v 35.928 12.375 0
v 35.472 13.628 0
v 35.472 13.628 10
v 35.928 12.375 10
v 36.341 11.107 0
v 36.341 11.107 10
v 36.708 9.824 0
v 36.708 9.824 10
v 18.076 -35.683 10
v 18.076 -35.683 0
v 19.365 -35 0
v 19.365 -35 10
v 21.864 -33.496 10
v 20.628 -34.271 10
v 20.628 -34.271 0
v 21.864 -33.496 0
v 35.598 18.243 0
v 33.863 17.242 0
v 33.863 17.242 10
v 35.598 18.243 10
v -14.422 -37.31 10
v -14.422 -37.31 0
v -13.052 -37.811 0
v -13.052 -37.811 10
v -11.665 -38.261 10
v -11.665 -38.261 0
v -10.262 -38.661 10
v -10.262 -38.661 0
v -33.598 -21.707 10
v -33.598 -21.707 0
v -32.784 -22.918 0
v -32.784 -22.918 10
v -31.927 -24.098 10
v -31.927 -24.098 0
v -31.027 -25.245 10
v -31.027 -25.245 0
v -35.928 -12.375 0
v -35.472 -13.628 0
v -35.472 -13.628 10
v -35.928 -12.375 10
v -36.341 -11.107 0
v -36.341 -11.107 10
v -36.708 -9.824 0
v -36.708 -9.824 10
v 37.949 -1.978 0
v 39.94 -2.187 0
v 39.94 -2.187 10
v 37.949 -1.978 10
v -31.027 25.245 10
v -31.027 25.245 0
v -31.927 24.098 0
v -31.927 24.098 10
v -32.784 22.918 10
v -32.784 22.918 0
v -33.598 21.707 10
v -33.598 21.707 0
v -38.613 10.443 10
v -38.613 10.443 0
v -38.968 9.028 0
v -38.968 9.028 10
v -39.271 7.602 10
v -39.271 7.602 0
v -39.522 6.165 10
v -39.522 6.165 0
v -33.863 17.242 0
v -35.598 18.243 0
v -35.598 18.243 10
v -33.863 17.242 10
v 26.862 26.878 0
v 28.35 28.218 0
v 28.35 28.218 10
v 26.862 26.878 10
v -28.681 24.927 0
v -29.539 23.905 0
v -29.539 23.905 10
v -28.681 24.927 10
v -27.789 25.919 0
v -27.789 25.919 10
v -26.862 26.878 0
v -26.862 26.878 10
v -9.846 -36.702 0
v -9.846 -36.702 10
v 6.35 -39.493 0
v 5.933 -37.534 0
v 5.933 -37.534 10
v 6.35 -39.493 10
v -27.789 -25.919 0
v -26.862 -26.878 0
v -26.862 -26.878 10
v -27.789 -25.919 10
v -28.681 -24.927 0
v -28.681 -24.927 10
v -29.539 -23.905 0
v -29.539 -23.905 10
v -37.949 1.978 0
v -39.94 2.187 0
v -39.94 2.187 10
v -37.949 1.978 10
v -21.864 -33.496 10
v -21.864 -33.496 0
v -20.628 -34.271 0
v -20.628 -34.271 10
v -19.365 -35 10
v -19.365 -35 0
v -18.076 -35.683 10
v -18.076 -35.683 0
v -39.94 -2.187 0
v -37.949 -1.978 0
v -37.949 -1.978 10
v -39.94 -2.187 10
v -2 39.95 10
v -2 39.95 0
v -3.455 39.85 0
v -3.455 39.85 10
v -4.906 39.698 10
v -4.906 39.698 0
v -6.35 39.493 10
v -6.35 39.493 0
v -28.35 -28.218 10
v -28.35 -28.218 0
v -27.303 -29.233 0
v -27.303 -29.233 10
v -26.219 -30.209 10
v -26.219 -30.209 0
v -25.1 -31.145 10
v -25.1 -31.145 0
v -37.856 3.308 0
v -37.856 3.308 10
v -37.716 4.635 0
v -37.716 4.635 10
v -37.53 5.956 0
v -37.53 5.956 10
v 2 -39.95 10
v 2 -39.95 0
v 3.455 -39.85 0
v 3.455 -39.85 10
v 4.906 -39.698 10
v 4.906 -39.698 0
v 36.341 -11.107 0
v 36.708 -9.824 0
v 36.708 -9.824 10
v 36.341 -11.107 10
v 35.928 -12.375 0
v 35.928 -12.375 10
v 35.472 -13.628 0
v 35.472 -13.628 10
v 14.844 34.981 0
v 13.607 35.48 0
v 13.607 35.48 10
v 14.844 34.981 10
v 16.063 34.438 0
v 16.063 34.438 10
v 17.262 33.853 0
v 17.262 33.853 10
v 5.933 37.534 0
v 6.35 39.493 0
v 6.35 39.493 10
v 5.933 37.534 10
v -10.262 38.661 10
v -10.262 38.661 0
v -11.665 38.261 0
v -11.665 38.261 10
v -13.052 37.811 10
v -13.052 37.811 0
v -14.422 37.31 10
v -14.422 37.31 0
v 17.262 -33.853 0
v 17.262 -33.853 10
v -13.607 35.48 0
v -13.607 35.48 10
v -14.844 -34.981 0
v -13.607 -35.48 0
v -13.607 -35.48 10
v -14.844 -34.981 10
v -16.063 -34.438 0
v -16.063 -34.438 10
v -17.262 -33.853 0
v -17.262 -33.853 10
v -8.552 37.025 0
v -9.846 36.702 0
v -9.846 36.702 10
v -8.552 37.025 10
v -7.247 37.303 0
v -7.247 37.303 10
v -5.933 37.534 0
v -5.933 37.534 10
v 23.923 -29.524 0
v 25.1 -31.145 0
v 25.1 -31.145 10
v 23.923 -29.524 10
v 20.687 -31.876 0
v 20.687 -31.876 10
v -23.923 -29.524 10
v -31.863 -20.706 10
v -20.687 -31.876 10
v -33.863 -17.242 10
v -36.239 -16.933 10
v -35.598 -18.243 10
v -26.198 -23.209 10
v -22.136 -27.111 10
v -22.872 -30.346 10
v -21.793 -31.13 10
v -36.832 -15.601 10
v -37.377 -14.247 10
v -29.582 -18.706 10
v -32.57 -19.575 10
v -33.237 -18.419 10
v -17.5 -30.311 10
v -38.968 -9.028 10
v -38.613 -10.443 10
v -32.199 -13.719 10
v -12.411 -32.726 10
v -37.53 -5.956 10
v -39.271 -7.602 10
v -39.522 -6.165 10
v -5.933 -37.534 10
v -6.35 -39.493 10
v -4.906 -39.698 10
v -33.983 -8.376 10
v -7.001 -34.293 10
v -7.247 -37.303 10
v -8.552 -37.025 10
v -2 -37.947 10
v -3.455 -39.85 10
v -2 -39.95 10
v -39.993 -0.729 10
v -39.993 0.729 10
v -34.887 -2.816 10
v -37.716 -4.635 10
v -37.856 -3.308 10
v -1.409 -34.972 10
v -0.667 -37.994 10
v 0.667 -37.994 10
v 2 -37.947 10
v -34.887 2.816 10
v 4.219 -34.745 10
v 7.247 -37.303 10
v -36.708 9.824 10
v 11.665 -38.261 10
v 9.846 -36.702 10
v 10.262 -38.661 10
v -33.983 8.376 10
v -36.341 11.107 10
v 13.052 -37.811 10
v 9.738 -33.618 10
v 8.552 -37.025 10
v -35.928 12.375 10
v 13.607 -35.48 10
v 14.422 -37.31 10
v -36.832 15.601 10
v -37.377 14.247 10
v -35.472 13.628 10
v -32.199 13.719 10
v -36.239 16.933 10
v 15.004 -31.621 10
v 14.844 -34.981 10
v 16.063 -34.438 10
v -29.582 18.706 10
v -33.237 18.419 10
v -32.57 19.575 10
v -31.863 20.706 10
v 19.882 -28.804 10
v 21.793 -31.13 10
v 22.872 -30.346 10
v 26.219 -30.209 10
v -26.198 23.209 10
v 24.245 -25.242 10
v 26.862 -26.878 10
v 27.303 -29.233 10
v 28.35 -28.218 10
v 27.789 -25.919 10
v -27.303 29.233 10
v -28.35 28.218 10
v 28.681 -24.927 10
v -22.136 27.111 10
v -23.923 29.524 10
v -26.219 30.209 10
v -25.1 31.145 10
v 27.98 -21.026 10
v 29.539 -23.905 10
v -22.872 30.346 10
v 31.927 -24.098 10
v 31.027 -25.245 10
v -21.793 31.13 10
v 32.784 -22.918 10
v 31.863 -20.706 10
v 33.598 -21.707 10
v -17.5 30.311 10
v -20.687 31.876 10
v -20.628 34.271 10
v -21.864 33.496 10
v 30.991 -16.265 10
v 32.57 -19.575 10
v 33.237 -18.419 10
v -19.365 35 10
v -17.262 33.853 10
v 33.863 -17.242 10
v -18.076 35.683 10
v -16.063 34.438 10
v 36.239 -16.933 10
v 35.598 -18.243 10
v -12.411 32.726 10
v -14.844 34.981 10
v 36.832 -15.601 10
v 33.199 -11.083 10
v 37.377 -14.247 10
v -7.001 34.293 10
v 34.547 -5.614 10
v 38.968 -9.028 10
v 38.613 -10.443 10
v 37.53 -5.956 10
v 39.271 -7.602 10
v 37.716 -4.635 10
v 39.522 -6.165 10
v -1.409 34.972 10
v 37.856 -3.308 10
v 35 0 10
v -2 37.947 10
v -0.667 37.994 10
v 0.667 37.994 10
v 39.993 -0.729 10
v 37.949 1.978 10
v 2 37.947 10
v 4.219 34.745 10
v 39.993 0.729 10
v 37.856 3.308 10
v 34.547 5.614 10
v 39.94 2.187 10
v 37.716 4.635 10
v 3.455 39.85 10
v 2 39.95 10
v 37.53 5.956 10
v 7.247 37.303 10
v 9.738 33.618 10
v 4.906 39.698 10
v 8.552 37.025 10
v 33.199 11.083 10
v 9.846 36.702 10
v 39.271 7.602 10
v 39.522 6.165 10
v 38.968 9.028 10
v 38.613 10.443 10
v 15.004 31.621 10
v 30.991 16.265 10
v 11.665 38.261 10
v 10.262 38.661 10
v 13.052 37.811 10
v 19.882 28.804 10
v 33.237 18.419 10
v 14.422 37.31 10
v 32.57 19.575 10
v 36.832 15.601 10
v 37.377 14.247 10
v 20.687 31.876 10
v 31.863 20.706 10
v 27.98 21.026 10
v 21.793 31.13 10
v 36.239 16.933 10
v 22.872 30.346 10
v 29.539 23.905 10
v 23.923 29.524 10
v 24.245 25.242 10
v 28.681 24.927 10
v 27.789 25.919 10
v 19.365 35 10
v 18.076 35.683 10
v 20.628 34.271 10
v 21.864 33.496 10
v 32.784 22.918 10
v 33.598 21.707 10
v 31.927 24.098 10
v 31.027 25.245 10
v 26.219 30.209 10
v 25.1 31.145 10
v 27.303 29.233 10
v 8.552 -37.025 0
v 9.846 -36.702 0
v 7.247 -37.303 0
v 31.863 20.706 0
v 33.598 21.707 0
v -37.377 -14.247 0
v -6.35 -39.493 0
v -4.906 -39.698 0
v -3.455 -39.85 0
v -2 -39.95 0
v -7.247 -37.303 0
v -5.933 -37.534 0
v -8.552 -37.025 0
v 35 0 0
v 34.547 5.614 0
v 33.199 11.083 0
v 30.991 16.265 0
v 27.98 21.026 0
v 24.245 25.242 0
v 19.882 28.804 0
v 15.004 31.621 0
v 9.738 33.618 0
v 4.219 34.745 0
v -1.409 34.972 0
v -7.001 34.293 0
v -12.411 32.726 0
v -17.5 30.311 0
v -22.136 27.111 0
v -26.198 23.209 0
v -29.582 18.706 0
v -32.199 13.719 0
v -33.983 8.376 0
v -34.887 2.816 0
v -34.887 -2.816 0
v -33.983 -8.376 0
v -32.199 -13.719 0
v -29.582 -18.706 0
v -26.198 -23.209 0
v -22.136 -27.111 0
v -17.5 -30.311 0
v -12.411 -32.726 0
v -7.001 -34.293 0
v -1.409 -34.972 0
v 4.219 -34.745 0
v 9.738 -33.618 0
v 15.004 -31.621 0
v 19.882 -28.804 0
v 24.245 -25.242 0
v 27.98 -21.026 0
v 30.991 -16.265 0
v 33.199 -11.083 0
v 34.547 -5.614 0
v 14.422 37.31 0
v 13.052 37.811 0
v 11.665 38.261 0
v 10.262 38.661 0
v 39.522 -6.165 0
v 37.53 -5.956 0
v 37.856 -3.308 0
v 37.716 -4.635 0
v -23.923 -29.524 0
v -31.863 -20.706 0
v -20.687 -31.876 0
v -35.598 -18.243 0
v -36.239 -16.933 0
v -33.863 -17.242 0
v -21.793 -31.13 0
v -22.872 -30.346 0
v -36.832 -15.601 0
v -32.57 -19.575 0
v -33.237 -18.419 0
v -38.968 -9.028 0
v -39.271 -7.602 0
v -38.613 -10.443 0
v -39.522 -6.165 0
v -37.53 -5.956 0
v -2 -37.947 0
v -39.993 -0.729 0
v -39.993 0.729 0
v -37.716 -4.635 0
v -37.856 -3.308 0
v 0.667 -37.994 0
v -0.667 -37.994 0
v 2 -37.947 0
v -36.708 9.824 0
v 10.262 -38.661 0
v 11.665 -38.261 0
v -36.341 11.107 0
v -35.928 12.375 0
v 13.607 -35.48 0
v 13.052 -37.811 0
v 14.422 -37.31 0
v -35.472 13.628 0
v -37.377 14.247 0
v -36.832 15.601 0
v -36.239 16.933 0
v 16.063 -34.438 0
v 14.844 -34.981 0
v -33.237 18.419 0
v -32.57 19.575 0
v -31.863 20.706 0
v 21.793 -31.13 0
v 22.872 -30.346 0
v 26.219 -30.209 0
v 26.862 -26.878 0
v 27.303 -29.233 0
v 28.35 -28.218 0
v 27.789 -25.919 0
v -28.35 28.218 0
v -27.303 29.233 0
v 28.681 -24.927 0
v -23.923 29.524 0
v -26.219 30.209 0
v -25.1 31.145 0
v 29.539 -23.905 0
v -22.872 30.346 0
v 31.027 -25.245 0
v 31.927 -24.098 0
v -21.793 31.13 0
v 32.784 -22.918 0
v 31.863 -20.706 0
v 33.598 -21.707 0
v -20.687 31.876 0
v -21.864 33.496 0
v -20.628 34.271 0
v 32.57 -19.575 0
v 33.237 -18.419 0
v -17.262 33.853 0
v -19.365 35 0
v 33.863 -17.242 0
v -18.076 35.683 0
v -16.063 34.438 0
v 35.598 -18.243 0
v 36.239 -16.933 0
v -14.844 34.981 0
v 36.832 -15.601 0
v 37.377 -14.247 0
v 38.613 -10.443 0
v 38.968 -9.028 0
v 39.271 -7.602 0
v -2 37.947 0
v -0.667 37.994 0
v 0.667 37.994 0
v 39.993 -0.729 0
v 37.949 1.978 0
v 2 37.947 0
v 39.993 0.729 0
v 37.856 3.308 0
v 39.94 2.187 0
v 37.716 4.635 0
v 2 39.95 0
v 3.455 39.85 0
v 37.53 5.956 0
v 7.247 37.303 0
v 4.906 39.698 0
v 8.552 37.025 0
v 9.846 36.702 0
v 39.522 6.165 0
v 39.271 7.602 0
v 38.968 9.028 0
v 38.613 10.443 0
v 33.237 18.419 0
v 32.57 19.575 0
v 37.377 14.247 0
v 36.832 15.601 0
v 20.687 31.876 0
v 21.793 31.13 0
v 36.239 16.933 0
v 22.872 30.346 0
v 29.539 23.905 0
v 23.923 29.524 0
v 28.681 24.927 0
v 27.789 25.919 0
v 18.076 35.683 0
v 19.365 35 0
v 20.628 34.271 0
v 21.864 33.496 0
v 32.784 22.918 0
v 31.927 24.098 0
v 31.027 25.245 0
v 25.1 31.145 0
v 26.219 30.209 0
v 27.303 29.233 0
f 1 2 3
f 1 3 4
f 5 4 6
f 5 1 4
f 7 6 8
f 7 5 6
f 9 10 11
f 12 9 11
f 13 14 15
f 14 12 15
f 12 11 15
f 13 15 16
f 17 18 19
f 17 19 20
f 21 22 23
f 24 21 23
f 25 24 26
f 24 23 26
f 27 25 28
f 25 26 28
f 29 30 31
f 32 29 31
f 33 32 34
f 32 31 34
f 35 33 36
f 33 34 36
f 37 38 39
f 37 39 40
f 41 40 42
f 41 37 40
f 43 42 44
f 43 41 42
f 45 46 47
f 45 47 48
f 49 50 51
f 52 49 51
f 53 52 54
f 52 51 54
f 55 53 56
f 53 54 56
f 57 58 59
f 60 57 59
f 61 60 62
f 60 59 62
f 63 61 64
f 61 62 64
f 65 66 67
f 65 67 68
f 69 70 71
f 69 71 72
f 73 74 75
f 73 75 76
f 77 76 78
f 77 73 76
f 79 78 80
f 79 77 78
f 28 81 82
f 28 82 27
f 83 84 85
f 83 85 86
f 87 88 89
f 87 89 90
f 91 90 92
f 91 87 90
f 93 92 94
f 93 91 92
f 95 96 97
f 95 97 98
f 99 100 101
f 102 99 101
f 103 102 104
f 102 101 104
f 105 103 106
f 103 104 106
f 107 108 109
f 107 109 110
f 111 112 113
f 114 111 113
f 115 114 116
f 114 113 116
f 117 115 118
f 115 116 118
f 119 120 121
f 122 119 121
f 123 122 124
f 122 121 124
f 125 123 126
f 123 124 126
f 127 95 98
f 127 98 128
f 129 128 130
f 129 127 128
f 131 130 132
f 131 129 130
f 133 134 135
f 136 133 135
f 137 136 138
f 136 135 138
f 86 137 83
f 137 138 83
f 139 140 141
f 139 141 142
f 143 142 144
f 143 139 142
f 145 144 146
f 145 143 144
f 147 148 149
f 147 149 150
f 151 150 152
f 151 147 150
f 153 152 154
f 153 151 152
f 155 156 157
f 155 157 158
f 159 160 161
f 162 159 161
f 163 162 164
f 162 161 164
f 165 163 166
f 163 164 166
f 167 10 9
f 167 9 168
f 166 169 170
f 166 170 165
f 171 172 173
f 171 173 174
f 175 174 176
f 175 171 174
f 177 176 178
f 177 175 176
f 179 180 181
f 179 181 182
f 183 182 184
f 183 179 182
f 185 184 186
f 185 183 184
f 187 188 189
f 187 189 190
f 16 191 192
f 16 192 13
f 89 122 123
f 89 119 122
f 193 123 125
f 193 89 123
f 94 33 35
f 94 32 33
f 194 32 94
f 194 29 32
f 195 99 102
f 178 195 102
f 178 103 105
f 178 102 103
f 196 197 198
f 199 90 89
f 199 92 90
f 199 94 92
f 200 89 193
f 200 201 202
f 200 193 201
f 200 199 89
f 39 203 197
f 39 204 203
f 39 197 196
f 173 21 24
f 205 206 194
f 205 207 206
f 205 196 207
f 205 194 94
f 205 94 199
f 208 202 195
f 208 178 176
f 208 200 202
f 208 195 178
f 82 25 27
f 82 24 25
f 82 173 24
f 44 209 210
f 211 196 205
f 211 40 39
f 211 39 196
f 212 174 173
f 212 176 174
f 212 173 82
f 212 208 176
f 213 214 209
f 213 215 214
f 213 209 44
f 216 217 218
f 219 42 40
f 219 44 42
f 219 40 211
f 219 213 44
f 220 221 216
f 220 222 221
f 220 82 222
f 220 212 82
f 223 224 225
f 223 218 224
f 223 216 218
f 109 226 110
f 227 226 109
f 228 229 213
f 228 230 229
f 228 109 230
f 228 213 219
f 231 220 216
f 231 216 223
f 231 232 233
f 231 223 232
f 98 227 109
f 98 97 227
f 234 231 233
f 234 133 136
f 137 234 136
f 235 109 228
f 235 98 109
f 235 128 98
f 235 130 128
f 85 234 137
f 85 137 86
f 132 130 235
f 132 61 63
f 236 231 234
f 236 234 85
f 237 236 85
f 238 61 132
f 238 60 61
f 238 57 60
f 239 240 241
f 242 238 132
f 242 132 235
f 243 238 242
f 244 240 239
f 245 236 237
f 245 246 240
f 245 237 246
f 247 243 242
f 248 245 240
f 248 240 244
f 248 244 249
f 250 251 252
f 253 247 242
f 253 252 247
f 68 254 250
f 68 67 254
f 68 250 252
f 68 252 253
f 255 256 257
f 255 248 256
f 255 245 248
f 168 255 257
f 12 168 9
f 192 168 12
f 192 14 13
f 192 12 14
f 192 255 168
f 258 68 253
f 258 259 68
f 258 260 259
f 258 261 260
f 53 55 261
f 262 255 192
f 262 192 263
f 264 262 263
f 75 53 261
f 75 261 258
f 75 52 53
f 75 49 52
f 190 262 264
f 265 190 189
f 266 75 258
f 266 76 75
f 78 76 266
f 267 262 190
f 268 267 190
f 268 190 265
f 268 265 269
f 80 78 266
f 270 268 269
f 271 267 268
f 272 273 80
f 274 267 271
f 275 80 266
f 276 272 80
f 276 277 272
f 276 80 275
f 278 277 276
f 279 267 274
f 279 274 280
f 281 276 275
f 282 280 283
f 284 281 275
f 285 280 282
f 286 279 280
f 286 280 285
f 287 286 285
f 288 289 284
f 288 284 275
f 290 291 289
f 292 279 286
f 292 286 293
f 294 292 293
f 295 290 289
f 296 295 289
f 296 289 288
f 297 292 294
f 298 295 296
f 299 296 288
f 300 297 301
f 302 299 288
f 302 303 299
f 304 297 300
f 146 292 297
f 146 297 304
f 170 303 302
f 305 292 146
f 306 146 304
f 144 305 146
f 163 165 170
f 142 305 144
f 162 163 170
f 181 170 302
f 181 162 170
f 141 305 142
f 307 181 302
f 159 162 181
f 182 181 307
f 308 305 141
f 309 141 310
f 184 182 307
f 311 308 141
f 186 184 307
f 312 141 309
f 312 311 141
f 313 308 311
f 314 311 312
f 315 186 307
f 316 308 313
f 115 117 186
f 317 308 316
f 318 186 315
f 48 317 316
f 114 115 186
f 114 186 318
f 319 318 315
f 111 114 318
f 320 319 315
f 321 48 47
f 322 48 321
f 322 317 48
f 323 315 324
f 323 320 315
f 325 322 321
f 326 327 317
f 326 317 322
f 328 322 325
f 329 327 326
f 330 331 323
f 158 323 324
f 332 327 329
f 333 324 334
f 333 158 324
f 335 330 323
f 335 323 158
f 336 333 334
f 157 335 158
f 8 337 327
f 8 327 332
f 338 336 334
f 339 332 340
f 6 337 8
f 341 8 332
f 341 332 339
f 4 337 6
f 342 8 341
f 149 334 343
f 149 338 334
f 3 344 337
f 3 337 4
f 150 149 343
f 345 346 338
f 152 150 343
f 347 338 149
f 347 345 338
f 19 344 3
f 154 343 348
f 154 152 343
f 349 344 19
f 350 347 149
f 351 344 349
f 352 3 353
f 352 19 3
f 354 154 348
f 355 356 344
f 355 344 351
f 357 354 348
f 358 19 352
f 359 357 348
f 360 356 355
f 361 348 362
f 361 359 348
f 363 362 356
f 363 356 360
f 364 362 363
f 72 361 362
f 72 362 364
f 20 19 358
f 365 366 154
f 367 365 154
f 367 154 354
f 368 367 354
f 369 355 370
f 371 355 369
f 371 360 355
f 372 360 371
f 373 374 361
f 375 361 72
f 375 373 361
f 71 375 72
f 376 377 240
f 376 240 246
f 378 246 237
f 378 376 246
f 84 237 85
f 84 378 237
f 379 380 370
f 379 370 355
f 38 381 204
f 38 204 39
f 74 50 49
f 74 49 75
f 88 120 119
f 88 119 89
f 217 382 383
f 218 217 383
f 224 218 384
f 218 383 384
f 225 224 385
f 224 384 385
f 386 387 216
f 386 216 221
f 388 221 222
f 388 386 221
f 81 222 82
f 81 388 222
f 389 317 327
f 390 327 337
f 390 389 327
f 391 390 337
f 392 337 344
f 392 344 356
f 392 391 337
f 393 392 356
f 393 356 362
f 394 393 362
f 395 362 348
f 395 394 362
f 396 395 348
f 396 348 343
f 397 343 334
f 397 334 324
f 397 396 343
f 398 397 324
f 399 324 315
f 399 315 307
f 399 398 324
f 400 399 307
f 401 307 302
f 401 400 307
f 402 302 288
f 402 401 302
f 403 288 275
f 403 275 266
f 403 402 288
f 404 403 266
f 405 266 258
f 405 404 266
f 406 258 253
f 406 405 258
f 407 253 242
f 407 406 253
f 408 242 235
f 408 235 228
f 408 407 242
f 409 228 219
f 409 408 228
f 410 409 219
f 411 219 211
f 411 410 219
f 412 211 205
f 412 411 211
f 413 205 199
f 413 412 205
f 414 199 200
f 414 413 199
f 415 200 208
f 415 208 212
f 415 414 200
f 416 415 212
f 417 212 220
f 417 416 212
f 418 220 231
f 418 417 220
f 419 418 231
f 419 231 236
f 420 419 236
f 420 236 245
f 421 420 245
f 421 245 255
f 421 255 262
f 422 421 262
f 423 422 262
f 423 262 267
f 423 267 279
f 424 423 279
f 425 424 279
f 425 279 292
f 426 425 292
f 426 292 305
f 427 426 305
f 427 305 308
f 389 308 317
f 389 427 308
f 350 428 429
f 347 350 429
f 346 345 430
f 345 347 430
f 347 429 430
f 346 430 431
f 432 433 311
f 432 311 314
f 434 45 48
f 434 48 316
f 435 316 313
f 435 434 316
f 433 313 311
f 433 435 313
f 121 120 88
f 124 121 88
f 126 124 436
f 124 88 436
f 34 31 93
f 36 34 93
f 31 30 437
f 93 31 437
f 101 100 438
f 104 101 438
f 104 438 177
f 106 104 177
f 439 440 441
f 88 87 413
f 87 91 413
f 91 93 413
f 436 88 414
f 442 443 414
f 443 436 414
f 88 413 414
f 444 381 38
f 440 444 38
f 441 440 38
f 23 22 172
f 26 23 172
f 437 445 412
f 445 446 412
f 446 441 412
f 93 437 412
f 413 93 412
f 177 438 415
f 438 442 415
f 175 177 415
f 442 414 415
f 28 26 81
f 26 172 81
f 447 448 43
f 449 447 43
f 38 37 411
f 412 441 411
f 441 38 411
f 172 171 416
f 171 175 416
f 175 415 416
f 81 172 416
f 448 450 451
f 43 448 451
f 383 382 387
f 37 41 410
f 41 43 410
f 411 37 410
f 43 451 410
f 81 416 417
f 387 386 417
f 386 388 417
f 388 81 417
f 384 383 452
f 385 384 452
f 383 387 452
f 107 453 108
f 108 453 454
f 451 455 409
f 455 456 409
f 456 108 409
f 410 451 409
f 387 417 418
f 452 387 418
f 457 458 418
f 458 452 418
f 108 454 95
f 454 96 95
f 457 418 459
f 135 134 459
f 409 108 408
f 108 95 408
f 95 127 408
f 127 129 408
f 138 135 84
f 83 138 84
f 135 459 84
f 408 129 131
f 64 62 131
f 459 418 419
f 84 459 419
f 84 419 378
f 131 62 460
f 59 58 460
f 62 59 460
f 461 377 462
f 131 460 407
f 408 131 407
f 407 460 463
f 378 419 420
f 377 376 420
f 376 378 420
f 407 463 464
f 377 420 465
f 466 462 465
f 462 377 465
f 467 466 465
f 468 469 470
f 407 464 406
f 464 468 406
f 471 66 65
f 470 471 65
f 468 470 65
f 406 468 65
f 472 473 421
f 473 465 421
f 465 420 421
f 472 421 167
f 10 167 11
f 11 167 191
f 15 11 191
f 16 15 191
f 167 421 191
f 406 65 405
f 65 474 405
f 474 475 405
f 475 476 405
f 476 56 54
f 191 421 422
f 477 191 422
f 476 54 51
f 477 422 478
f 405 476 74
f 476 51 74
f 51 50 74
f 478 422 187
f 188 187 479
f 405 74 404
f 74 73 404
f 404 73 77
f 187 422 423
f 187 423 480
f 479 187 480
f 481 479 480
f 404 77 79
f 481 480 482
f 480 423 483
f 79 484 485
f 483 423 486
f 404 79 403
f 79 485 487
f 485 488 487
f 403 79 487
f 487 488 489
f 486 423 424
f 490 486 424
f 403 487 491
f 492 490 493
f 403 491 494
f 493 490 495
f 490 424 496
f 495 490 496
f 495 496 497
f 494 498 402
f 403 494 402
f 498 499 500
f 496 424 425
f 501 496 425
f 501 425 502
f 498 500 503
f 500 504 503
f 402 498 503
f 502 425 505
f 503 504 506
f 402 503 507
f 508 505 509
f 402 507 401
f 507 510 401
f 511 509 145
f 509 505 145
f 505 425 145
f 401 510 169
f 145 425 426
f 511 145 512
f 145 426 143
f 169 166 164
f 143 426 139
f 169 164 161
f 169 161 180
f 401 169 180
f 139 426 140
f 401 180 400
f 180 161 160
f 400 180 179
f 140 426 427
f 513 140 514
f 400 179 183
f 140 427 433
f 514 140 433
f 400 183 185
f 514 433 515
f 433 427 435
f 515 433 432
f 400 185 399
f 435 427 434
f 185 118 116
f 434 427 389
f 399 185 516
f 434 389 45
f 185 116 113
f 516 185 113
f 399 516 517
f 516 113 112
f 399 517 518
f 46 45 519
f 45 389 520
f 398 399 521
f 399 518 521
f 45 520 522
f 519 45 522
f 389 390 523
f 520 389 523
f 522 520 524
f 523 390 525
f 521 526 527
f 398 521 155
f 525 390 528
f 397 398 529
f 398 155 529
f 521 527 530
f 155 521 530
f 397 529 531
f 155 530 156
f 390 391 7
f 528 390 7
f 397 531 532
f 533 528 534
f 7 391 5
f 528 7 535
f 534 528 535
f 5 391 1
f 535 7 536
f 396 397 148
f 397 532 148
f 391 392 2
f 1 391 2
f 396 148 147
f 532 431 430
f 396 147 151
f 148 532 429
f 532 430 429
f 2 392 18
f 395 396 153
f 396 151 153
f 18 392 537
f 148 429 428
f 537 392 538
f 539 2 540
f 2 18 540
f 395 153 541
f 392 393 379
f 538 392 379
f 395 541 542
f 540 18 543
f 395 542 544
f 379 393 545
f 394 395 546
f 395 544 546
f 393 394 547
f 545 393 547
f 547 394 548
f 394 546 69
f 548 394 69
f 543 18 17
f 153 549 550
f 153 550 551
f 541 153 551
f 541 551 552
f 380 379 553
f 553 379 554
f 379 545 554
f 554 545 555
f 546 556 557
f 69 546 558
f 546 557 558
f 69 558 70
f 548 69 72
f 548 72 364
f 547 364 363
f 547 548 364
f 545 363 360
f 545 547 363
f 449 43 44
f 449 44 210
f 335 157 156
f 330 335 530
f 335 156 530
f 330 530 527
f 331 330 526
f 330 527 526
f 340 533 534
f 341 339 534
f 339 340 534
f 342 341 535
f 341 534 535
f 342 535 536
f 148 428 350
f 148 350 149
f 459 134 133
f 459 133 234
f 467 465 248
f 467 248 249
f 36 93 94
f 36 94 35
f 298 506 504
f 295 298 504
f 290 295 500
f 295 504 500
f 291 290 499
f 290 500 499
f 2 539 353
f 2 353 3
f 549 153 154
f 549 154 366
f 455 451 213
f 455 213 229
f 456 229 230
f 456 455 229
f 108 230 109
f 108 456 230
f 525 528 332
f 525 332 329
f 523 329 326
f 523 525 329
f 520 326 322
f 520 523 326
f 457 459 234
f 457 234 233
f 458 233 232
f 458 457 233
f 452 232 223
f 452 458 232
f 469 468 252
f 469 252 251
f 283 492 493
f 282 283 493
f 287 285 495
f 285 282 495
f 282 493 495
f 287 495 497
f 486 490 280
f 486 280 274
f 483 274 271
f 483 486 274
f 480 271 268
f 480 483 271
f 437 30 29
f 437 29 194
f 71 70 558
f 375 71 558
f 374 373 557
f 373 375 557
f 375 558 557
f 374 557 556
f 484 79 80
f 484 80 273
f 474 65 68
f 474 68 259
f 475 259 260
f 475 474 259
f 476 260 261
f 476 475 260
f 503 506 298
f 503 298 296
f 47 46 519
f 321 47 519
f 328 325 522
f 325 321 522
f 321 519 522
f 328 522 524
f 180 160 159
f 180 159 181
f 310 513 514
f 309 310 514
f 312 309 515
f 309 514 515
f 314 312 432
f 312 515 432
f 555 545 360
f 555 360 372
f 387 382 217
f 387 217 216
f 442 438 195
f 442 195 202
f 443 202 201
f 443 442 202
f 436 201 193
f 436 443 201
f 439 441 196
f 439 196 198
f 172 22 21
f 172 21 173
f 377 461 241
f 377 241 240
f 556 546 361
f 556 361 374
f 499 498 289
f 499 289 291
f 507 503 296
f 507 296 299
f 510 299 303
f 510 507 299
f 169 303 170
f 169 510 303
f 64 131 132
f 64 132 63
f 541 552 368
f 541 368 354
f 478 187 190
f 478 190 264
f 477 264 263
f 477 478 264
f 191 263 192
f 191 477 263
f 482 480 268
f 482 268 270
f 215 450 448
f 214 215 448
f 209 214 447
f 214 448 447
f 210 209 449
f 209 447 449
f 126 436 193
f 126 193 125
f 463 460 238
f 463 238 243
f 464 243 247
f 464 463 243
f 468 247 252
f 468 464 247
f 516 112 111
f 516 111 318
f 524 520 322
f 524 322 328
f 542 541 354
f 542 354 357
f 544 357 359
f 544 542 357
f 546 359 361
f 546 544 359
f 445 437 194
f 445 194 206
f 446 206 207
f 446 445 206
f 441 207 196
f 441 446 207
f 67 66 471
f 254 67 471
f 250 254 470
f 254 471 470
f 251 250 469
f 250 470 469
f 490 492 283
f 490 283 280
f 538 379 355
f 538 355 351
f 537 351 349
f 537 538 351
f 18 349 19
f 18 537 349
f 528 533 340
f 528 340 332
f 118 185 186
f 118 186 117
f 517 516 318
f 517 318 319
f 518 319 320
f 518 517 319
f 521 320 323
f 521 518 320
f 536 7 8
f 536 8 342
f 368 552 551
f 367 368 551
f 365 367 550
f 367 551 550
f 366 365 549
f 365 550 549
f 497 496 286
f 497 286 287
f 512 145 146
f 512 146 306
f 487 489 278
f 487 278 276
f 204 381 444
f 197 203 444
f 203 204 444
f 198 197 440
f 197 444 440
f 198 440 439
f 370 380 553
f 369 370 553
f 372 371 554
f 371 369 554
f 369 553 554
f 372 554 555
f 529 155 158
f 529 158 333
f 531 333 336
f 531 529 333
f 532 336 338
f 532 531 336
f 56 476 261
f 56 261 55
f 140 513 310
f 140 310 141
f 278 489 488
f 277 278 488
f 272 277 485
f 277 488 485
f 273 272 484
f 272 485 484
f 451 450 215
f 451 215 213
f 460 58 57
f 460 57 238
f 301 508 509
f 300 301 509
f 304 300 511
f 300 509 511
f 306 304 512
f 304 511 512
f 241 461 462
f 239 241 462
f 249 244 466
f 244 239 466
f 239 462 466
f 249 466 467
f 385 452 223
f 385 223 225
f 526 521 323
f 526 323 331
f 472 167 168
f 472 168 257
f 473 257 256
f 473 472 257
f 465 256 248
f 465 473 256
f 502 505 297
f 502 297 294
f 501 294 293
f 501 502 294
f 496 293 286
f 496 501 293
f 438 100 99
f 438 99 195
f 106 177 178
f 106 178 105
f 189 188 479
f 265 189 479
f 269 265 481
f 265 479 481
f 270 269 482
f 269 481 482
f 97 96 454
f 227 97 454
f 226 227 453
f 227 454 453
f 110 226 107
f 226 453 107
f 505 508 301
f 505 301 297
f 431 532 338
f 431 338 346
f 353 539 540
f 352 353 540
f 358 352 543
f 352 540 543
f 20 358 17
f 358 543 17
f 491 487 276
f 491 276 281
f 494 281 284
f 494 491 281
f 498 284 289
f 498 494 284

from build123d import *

# Parameters (mm, degrees)
SKETCH1_R           = 40
SKETCH1_R_2         = 35
BOSS_EXTRUDE1_DEPTH = 10
CUT_EXTRUDE5_DEPTH  = 10
CIRPATTERN2_COUNT   = 30


with BuildPart() as part:
    # Sketch1 → Boss-Extrude1 (new body)
    with BuildSketch(Plane.XY):
        Circle(SKETCH1_R)
        Circle(SKETCH1_R_2, mode=Mode.SUBTRACT)
    extrude(amount=BOSS_EXTRUDE1_DEPTH)

    # Sketch4 → Cut-Extrude5 (cut)
    with BuildSketch(Plane.XY):
        with BuildLine():
            Line((2, 37.947331922), (2, 39.949968711))
            ThreePointArc((2, 39.949968711), (0, 40), (-2, 39.949968711))
            Line((-2, 39.949968711), (-2, 37.947331922))
            ThreePointArc((-2, 37.947331922), (0, 38), (2, 37.947331922))
        make_face()
    cut_extrude5 = extrude(amount=CUT_EXTRUDE5_DEPTH, mode=Mode.SUBTRACT)

    # CirPattern2: Cut-Extrude5 ×30 about axis
    cirpattern2_axis = Axis((0, 0, 0), (0, 0, 1))
    for i in range(1, CIRPATTERN2_COUNT):
        add(cut_extrude5.rotate(cirpattern2_axis, i * 360 / CIRPATTERN2_COUNT), mode=Mode.SUBTRACT)


solid = part.part
